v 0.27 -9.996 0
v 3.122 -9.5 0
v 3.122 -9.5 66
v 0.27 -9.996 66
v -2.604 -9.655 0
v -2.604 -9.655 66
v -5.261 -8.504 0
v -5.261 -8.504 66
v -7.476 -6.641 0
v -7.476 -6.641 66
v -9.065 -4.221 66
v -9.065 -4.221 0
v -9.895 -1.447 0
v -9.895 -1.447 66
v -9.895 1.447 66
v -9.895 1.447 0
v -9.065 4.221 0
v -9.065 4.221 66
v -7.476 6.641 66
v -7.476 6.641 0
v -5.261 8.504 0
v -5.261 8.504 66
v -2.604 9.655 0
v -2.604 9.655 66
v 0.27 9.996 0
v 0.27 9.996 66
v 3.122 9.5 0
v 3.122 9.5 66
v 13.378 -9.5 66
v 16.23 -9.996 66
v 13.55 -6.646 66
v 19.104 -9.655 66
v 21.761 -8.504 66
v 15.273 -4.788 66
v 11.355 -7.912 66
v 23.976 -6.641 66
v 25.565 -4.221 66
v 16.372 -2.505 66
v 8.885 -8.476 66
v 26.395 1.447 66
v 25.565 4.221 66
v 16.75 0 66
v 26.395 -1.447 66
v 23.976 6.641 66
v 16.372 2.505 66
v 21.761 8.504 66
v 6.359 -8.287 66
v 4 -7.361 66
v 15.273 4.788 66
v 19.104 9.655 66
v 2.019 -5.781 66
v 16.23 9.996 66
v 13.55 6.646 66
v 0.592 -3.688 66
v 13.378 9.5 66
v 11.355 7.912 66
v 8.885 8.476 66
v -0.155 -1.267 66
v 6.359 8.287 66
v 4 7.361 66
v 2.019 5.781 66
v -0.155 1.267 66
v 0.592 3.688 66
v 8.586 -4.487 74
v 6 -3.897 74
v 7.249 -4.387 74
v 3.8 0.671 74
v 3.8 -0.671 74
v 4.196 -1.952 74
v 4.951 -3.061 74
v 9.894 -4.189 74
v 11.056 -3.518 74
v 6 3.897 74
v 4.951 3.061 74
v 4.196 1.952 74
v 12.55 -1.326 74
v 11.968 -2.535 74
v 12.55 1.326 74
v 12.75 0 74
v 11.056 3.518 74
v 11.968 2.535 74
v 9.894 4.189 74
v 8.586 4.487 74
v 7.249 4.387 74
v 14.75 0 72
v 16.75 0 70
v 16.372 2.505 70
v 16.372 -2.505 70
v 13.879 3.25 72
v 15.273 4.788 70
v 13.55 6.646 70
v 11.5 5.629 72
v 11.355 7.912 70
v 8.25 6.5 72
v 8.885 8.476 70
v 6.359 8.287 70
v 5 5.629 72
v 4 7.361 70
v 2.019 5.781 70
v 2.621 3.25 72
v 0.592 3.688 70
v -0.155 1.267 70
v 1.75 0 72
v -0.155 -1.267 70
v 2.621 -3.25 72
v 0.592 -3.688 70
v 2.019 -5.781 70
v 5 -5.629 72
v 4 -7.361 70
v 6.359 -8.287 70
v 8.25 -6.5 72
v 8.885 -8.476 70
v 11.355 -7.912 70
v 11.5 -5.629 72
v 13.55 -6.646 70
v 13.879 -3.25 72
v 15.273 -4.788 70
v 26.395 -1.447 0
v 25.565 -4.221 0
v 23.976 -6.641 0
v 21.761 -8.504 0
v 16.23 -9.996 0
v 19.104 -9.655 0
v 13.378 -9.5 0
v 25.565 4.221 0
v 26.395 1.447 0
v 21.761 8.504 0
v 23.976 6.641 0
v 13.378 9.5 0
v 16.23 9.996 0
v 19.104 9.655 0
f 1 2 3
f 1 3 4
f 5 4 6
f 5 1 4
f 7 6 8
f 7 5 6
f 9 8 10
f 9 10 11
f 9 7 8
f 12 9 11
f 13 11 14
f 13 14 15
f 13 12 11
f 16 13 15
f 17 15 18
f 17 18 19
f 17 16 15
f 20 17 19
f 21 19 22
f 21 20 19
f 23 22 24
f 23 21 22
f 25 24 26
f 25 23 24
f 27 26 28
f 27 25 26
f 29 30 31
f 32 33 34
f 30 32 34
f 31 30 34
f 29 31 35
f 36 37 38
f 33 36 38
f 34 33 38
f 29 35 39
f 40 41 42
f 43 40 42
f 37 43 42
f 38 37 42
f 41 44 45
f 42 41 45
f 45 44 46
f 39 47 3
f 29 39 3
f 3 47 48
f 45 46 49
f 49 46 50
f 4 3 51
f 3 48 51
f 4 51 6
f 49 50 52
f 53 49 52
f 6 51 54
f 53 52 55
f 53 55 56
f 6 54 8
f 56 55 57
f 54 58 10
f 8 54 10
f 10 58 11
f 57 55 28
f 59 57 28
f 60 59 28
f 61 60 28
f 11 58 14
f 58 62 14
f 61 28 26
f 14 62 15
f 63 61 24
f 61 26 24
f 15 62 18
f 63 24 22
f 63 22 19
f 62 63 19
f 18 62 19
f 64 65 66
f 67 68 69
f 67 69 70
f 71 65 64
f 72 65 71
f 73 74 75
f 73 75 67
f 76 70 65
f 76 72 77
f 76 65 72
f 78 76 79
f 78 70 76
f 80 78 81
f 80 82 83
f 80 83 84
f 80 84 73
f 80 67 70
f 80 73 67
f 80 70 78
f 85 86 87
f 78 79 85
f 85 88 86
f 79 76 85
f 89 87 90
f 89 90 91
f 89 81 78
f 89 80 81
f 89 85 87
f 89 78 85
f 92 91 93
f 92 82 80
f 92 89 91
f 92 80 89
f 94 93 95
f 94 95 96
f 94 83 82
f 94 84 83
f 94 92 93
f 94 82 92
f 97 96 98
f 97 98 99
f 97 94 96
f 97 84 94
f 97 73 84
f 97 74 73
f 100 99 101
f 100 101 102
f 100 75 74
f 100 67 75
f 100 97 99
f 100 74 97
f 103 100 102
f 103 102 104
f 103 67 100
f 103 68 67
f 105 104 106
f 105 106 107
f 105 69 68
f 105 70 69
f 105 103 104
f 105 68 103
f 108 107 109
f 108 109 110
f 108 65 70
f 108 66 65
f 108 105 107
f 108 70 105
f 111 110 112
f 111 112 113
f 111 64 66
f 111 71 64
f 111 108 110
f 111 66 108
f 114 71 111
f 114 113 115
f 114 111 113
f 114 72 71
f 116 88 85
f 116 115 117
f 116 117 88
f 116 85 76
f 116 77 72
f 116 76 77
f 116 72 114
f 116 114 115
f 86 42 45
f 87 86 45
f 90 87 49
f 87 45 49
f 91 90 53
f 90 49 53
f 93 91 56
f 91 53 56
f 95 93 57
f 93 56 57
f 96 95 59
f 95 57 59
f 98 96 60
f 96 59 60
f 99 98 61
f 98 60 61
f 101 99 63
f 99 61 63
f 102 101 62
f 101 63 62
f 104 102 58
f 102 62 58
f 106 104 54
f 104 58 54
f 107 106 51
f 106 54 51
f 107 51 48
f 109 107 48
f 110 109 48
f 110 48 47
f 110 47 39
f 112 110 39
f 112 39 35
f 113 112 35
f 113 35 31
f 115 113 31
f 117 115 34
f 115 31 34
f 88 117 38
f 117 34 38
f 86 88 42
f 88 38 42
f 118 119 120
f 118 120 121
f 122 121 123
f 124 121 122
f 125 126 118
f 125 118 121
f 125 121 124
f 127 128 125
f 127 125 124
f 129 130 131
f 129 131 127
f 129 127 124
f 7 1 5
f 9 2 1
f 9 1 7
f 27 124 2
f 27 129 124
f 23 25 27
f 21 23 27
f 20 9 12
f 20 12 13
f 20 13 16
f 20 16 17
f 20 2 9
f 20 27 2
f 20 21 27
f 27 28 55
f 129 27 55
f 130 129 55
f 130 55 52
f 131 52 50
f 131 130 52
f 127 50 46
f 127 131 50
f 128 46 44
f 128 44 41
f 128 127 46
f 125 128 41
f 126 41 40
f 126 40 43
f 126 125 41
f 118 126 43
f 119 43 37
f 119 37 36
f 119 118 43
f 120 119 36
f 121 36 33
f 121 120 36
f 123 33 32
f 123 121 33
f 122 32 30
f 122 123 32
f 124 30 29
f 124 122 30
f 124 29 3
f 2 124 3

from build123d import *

# Parameters (mm, degrees)
BOSS_EXTRUDE1_DEPTH = 66
SKETCH2_R           = 8.5
BOSS_EXTRUDE2_DEPTH = 8
CHAMFER1_SIZE       = 4


with BuildPart() as part:
    # Sketch1 → Boss-Extrude1 (new body)
    with BuildSketch(Plane.XY):
        with BuildLine():
            Line((3.122498999, 9.5), (13.377501001, 9.5))
            ThreePointArc((13.377501001, 9.5), (26.5, 0), (13.377501001, -9.5))
            Line((13.377501001, -9.5), (3.122498999, -9.5))
            ThreePointArc((3.122498999, -9.5), (-10, 0), (3.122498999, 9.5))
        make_face()
    extrude(amount=BOSS_EXTRUDE1_DEPTH)

    # Sketch2 → Boss-Extrude2 (add)
    with BuildSketch(Plane.XY.offset(66)):
        with Locations((8.25, 0)):
            Circle(SKETCH2_R)
    extrude(amount=BOSS_EXTRUDE2_DEPTH)

    # Chamfer1
    chamfer1_edges = [part.edges().sort_by_distance(p)[0] for p in [
        (-0.25, 0, 74),
    ]]
    chamfer(chamfer1_edges, length=CHAMFER1_SIZE)


solid = part.part
